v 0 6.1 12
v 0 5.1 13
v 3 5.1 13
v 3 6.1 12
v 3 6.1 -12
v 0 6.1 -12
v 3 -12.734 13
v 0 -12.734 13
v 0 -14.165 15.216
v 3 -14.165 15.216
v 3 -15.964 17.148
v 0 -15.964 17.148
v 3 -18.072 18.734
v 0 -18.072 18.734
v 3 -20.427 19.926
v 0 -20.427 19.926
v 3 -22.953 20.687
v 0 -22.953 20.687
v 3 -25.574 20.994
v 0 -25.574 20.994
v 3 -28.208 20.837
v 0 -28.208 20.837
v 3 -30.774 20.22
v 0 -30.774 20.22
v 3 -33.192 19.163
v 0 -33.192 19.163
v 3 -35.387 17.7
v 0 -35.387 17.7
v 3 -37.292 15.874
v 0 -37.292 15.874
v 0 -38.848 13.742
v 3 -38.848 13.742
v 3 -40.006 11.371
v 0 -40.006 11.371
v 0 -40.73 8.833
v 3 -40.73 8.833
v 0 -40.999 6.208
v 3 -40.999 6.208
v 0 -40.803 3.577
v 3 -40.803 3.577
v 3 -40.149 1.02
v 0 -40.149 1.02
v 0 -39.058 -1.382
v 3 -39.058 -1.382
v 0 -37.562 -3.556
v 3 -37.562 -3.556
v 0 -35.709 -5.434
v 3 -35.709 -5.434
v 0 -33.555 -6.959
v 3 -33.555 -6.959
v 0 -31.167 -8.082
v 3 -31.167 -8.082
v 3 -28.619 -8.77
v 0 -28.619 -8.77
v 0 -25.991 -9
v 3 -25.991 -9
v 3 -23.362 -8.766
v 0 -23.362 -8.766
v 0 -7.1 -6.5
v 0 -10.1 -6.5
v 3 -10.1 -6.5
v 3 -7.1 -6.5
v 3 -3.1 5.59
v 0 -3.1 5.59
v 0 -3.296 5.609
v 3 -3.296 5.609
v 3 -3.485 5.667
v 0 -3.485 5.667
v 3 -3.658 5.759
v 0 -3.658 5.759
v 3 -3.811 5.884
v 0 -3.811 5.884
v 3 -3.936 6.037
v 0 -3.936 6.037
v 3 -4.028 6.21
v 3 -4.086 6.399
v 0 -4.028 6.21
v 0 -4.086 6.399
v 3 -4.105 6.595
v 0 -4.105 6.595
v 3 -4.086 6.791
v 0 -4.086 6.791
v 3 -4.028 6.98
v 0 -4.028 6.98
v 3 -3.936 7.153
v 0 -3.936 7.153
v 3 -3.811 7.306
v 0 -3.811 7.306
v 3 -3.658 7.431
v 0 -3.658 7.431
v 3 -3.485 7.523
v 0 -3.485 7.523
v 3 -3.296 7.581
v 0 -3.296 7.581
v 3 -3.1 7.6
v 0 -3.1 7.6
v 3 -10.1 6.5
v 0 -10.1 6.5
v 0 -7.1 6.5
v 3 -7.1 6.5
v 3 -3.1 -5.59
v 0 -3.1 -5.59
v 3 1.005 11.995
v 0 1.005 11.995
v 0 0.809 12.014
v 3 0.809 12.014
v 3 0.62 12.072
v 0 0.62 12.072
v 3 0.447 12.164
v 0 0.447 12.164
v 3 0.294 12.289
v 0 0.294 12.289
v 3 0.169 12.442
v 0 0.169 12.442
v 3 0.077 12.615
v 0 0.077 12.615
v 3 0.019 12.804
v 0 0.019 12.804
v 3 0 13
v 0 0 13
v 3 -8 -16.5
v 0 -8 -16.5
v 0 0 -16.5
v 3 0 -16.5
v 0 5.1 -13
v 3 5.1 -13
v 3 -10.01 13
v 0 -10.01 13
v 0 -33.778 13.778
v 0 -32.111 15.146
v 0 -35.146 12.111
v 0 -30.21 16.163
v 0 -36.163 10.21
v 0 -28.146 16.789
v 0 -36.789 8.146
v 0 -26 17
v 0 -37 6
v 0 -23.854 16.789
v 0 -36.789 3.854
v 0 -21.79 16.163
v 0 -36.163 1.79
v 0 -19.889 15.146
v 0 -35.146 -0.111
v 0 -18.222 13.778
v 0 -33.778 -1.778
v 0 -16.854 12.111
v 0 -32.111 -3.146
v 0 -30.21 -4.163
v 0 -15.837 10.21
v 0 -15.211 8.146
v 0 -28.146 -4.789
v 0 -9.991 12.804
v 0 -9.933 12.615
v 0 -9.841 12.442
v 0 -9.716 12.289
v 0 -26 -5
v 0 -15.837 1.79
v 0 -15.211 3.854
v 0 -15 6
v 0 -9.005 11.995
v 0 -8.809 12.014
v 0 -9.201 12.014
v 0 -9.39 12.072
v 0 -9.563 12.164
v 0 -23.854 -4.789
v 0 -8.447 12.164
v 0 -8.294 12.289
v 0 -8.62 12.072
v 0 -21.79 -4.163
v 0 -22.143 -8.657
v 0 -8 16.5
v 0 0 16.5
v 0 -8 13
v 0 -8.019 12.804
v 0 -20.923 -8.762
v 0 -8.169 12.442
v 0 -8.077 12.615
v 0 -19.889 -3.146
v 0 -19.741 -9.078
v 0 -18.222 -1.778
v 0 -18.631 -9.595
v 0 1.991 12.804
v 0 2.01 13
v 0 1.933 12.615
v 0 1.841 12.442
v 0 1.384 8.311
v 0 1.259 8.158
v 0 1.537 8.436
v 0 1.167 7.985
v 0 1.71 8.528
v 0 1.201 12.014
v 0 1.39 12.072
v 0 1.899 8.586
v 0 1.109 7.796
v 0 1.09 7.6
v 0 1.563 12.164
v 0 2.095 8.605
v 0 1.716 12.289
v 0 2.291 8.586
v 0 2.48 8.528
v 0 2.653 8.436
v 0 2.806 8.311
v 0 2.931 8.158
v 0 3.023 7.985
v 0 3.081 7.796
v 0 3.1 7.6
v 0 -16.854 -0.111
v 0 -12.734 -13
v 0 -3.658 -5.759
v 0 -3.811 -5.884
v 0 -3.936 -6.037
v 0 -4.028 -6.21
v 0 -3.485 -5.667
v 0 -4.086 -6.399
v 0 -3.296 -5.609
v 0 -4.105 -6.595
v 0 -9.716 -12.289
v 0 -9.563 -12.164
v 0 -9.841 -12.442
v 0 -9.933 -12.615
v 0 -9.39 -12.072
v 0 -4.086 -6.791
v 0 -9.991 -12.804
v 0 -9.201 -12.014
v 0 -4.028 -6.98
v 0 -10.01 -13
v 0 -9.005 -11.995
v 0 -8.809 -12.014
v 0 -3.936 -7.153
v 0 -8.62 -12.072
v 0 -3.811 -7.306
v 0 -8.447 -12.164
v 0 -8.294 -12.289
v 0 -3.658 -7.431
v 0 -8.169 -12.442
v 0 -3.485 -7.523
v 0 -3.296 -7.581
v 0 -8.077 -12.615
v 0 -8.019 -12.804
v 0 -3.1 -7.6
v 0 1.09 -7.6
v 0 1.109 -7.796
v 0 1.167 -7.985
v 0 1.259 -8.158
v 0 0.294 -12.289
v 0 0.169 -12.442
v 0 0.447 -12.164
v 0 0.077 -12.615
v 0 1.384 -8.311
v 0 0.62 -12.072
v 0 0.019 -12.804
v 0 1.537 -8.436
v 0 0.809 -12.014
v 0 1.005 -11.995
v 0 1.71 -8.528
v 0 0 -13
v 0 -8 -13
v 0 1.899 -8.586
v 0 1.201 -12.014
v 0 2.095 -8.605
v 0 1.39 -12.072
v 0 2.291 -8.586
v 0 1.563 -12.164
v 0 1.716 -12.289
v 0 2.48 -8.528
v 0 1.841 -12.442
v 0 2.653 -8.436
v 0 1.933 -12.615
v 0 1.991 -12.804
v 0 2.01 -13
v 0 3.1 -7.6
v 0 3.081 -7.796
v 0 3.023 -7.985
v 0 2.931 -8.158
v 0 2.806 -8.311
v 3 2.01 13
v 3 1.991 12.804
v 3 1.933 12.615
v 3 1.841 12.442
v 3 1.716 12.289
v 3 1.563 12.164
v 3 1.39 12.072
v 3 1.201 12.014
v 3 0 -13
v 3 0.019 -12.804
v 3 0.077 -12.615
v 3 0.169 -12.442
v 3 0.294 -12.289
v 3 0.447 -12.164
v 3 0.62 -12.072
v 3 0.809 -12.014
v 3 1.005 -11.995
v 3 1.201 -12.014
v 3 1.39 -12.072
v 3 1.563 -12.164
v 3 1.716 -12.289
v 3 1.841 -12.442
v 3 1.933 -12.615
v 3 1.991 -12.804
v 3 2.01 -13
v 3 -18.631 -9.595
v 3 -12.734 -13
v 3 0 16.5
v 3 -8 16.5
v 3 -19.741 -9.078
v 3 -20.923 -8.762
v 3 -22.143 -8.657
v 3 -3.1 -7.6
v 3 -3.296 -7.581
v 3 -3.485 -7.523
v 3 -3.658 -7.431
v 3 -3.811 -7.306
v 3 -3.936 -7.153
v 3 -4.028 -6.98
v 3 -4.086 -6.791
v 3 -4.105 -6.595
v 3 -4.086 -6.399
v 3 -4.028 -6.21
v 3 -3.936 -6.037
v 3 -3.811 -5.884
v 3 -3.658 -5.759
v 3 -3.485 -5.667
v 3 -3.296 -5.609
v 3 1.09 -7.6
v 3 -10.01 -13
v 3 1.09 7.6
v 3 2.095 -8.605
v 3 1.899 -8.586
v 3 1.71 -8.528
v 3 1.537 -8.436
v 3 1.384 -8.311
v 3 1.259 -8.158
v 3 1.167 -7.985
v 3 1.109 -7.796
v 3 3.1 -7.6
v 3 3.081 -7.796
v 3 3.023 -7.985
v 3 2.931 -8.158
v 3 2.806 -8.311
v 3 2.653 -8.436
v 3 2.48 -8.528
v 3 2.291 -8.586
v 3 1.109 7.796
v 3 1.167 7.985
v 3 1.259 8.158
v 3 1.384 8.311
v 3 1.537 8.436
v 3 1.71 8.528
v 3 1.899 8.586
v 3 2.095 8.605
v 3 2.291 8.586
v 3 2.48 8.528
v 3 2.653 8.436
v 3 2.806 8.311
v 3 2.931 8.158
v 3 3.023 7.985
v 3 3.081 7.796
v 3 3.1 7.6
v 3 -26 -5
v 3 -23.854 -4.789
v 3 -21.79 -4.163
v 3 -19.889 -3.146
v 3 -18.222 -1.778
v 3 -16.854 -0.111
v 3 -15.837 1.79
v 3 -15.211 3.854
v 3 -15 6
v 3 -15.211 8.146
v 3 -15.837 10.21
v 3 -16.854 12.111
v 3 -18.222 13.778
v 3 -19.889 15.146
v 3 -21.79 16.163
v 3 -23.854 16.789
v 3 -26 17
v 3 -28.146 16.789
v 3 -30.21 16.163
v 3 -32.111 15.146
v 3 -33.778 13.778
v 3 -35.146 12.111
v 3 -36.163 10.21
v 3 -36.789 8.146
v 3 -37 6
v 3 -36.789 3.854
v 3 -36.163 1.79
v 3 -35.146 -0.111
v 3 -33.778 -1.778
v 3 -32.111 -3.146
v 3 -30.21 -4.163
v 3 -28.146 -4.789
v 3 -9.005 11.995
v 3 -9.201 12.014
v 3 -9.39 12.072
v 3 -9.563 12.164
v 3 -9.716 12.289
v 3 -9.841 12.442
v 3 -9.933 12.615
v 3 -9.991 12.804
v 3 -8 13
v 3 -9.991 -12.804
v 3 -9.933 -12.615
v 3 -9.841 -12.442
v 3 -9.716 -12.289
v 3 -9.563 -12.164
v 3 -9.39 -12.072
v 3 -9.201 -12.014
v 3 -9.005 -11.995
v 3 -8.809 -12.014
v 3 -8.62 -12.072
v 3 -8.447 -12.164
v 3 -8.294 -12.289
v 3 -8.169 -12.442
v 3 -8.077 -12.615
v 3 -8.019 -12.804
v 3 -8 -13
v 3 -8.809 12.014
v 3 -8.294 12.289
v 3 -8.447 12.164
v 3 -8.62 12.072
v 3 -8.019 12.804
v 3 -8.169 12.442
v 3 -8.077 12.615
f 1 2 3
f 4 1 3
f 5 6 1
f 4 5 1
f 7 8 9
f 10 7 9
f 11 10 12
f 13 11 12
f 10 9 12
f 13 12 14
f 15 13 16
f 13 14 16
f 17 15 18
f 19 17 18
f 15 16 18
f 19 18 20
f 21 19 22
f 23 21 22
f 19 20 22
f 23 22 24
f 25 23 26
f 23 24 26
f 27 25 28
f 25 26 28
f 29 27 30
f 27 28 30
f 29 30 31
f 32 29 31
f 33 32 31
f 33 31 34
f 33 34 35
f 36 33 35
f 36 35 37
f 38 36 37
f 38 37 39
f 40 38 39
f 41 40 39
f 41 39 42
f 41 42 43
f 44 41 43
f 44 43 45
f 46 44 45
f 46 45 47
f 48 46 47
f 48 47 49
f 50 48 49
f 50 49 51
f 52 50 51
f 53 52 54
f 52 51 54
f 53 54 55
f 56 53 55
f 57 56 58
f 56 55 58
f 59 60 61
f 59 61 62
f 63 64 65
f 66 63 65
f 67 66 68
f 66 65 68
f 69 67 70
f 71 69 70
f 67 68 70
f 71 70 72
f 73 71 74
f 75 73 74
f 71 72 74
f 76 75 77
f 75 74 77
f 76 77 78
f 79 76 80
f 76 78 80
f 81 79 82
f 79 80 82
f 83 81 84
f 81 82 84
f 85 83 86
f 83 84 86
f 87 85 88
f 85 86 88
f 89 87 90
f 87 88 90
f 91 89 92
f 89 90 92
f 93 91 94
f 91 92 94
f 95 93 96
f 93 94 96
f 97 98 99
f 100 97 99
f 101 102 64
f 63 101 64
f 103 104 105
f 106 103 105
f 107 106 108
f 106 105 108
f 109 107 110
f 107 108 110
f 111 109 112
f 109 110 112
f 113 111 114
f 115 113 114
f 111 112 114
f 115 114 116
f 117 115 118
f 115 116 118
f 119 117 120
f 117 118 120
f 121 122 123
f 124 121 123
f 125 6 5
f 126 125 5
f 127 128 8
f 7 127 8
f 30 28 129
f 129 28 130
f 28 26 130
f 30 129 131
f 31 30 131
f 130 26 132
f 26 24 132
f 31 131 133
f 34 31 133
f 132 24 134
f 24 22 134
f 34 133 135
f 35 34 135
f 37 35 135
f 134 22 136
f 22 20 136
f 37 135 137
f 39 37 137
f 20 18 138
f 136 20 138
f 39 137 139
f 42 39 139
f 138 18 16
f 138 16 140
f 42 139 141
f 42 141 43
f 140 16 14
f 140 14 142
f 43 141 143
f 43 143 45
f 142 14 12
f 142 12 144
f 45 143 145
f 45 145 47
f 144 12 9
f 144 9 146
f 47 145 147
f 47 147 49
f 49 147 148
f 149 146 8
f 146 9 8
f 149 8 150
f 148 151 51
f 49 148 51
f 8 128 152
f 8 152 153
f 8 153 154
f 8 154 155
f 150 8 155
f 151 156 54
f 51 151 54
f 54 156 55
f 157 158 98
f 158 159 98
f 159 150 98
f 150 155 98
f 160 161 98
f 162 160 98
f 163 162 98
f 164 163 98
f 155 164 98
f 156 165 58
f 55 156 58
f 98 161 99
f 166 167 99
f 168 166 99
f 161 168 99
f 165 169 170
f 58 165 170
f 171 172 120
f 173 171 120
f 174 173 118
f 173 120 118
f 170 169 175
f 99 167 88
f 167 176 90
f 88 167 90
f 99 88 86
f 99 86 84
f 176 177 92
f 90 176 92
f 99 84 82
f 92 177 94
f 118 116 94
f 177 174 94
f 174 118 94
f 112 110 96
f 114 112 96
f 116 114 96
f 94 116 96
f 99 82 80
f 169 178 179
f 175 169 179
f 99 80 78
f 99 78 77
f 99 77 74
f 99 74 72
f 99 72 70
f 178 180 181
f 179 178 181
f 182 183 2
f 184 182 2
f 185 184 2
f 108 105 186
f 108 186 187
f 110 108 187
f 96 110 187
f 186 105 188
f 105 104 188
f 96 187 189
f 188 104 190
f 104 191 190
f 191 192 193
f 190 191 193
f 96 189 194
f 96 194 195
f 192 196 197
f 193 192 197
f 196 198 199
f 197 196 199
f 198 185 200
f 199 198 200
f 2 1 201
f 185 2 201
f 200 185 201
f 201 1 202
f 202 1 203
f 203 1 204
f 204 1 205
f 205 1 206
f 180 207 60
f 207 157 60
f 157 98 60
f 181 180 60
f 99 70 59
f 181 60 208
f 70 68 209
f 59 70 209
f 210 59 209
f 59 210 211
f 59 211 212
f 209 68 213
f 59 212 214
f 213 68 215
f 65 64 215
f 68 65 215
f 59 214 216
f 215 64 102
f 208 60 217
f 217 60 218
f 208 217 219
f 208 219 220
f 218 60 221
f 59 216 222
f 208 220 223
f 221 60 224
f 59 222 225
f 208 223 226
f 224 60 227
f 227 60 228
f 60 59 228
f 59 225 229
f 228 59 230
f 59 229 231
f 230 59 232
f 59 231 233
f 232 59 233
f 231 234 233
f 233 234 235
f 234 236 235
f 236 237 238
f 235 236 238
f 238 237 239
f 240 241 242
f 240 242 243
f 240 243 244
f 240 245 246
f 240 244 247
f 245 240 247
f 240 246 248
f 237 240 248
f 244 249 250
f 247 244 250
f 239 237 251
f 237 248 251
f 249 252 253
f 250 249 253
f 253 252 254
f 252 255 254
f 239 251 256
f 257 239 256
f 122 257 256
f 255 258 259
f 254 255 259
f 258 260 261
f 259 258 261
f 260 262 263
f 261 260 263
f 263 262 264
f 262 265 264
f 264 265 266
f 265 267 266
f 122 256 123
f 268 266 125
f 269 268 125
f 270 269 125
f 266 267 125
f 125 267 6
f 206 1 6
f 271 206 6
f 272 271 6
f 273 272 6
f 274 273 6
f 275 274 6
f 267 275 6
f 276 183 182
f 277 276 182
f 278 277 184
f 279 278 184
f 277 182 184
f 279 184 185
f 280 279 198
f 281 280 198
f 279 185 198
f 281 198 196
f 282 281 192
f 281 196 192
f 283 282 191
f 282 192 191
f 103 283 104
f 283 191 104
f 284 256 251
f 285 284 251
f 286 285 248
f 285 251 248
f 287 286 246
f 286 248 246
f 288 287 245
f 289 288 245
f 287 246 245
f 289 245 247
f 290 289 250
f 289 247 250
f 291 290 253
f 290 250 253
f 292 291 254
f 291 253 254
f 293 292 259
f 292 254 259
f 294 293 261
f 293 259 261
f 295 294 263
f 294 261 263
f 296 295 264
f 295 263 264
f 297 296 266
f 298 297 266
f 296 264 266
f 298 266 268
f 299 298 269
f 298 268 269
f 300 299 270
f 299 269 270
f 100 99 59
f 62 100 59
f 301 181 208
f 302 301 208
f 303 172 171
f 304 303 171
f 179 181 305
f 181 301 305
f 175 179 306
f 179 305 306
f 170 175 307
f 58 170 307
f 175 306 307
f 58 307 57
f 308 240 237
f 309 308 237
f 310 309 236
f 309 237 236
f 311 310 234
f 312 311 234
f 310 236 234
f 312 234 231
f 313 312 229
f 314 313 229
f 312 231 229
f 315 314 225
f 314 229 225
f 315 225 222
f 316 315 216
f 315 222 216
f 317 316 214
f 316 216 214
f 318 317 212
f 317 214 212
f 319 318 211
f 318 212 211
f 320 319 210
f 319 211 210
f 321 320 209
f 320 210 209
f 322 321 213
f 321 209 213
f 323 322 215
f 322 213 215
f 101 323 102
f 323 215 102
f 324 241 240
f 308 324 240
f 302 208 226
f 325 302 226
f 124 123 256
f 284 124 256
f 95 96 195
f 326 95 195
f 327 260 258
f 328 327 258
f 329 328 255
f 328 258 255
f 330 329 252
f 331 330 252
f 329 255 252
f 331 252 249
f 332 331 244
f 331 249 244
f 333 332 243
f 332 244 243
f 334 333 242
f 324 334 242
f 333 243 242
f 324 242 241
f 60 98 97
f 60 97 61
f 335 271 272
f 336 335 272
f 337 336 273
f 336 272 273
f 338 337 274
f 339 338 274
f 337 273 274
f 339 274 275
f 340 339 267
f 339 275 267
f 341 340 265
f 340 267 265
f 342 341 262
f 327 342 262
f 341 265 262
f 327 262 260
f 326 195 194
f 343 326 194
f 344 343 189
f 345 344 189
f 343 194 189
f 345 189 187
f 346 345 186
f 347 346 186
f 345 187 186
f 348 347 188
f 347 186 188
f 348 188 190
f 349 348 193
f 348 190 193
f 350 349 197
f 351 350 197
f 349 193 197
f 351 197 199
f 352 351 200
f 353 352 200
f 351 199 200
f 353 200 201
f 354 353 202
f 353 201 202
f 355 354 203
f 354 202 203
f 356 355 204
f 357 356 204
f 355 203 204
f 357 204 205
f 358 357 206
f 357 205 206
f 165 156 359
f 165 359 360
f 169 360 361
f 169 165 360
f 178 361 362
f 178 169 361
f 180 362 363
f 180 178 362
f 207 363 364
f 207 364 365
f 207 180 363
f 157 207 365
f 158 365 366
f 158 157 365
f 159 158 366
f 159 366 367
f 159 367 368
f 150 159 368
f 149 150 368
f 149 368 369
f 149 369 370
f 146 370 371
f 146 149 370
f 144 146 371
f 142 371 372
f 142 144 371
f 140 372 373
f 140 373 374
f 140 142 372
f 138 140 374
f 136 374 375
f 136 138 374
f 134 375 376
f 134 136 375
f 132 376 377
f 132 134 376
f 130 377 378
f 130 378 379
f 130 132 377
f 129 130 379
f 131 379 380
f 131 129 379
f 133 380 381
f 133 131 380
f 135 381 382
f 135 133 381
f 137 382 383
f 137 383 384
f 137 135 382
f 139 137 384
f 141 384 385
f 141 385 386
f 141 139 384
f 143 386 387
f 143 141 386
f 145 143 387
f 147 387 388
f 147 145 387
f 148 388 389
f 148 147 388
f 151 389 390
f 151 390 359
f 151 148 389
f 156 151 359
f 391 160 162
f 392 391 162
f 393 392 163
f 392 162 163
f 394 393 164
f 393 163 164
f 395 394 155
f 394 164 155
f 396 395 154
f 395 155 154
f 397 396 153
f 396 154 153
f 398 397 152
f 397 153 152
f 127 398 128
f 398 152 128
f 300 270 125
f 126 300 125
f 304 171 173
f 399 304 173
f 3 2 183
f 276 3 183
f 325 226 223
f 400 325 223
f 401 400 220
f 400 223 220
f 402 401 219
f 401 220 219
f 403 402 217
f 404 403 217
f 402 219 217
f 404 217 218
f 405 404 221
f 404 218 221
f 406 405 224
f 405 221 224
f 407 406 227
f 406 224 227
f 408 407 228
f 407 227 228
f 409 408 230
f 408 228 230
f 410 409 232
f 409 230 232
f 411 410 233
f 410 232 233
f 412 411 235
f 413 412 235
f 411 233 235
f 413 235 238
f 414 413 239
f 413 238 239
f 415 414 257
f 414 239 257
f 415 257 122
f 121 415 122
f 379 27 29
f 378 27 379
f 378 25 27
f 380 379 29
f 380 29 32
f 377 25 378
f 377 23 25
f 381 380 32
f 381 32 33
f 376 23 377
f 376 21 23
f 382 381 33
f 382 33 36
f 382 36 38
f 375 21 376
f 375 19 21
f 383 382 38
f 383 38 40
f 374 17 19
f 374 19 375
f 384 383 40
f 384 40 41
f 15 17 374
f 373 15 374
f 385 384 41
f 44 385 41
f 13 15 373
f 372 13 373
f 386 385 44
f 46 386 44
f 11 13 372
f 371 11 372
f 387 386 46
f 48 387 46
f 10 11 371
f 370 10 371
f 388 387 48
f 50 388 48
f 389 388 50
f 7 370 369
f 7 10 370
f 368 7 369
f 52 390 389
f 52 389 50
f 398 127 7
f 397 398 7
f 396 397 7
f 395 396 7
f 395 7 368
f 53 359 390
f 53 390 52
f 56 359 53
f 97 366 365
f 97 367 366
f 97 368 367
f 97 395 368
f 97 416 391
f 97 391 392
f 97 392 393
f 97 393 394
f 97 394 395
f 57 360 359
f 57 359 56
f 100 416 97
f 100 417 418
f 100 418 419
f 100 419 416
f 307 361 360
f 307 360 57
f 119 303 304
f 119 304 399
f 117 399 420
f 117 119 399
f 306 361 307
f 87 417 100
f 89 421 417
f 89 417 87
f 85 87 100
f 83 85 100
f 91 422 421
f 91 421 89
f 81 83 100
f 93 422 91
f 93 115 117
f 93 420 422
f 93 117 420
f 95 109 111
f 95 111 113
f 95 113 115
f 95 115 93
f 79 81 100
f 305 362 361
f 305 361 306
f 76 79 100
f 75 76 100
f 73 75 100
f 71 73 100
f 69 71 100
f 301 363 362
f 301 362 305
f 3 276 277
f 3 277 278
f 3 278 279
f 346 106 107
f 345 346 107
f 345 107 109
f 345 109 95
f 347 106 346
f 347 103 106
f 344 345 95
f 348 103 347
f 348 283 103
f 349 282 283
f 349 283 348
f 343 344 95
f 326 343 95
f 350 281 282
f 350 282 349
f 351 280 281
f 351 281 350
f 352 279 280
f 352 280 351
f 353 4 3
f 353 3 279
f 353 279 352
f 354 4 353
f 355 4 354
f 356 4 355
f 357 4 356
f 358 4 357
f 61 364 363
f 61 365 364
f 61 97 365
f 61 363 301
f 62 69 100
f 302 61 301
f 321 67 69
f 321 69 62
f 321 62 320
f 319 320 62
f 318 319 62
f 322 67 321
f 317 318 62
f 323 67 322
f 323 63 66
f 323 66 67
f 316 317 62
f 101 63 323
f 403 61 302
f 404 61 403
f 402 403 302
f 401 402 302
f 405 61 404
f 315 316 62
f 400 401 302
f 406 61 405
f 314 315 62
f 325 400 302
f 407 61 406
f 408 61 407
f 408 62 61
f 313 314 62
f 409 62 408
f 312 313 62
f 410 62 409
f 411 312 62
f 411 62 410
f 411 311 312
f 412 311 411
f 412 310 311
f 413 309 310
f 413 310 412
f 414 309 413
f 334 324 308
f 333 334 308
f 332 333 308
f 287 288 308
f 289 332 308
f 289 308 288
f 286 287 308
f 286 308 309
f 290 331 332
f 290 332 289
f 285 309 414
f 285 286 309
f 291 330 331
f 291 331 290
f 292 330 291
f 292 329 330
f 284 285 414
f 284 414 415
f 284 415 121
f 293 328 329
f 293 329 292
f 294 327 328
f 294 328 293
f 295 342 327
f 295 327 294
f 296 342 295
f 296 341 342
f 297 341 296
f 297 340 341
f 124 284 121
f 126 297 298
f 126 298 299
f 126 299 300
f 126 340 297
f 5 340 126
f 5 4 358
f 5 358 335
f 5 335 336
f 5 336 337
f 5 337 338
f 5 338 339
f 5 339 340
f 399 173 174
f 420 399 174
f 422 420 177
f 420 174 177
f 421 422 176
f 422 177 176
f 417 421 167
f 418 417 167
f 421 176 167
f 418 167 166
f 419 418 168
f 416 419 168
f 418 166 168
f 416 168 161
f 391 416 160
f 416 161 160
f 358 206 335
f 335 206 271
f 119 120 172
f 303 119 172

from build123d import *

# Parameters (mm, degrees)
SKETCH_1_R      = 11
SKETCH_1_W      = 13
SKETCH_1_H      = 3
EXTRUDE_1_DEPTH = 3
FILLET_1_R      = 7
CHAMFER_1_SIZE  = 1


with BuildPart() as part:
    # 草图1 → 凸台-拉伸1 (new body)
    with BuildSketch(Plane(origin=(0, 0, 0), x_dir=(0, 0, -1), z_dir=(1, 0, 0))):
        with BuildLine():
            Line((13, 6.1), (-13, 6.1))
            Line((-13, 6.1), (-13, 2.01))
            ThreePointArc((-13, 2.01), (-12.289357685, 1.715642315), (-11.995, 1.005))
            ThreePointArc((-11.995, 1.005), (-12.289357685, 0.294357685), (-13, 0))
            Line((-13, 0), (-16.5, 0))
            Line((-16.5, 0), (-16.5, -8))
            Line((-16.5, -8), (-13, -8))
            ThreePointArc((-13, -8), (-12.289357685, -8.294357685), (-11.995, -9.005))
            ThreePointArc((-11.995, -9.005), (-12.289357685, -9.715642315), (-13, -10.01))
            Line((-13, -10.01), (-13, -12.733500839))
            ThreePointArc((-13, -12.733500839), (-11.507561308, -39.952303338), (8.174286015, -21.091882644))
            Line((8.174286015, -21.091882644), (13, -12.733500839))
            Line((13, -12.733500839), (13, -10.01))
            ThreePointArc((13, -10.01), (11.995, -9.005), (13, -8))
            Line((13, -8), (16.5, -8))
            Line((16.5, -8), (16.5, 0))
            Line((16.5, 0), (13, 0))
            ThreePointArc((13, 0), (11.995, 1.005), (13, 2.01))
            Line((13, 2.01), (13, 6.1))
        make_face()
        with Locations((-6, -26)):
            Circle(SKETCH_1_R, mode=Mode.SUBTRACT)
        with Locations((0, -8.6)):
            Rectangle(SKETCH_1_W, SKETCH_1_H, mode=Mode.SUBTRACT)
        with BuildLine():
            Line((5.59, -3.1), (-5.59, -3.1))
            ThreePointArc((-5.59, -3.1), (-6.595, -4.105), (-7.6, -3.1))
            Line((-7.6, -3.1), (-7.6, 1.09))
            ThreePointArc((-7.6, 1.09), (-8.605, 2.095), (-7.6, 3.1))
            Line((-7.6, 3.1), (7.6, 3.1))
            ThreePointArc((7.6, 3.1), (8.310642315, 2.805642315), (8.605, 2.095))
            ThreePointArc((8.605, 2.095), (8.310642315, 1.384357685), (7.6, 1.09))
            Line((7.6, 1.09), (7.6, -3.1))
            ThreePointArc((7.6, -3.1), (6.595, -4.105), (5.59, -3.1))
        make_face(mode=Mode.SUBTRACT)
    extrude(amount=EXTRUDE_1_DEPTH)

    # 圆角1
    fillet_1_edges = [part.edges().sort_by_distance(p)[0] for p in [
        (1.5, -21.091882644, -8.174286015),
    ]]
    fillet(fillet_1_edges, radius=FILLET_1_R)

    # 倒角1
    chamfer_1_edges = [part.edges().sort_by_distance(p)[0] for p in [
        (1.5, 6.1, 13),
        (1.5, 6.1, -13),
    ]]
    chamfer(chamfer_1_edges, length=CHAMFER_1_SIZE)


solid = part.part
